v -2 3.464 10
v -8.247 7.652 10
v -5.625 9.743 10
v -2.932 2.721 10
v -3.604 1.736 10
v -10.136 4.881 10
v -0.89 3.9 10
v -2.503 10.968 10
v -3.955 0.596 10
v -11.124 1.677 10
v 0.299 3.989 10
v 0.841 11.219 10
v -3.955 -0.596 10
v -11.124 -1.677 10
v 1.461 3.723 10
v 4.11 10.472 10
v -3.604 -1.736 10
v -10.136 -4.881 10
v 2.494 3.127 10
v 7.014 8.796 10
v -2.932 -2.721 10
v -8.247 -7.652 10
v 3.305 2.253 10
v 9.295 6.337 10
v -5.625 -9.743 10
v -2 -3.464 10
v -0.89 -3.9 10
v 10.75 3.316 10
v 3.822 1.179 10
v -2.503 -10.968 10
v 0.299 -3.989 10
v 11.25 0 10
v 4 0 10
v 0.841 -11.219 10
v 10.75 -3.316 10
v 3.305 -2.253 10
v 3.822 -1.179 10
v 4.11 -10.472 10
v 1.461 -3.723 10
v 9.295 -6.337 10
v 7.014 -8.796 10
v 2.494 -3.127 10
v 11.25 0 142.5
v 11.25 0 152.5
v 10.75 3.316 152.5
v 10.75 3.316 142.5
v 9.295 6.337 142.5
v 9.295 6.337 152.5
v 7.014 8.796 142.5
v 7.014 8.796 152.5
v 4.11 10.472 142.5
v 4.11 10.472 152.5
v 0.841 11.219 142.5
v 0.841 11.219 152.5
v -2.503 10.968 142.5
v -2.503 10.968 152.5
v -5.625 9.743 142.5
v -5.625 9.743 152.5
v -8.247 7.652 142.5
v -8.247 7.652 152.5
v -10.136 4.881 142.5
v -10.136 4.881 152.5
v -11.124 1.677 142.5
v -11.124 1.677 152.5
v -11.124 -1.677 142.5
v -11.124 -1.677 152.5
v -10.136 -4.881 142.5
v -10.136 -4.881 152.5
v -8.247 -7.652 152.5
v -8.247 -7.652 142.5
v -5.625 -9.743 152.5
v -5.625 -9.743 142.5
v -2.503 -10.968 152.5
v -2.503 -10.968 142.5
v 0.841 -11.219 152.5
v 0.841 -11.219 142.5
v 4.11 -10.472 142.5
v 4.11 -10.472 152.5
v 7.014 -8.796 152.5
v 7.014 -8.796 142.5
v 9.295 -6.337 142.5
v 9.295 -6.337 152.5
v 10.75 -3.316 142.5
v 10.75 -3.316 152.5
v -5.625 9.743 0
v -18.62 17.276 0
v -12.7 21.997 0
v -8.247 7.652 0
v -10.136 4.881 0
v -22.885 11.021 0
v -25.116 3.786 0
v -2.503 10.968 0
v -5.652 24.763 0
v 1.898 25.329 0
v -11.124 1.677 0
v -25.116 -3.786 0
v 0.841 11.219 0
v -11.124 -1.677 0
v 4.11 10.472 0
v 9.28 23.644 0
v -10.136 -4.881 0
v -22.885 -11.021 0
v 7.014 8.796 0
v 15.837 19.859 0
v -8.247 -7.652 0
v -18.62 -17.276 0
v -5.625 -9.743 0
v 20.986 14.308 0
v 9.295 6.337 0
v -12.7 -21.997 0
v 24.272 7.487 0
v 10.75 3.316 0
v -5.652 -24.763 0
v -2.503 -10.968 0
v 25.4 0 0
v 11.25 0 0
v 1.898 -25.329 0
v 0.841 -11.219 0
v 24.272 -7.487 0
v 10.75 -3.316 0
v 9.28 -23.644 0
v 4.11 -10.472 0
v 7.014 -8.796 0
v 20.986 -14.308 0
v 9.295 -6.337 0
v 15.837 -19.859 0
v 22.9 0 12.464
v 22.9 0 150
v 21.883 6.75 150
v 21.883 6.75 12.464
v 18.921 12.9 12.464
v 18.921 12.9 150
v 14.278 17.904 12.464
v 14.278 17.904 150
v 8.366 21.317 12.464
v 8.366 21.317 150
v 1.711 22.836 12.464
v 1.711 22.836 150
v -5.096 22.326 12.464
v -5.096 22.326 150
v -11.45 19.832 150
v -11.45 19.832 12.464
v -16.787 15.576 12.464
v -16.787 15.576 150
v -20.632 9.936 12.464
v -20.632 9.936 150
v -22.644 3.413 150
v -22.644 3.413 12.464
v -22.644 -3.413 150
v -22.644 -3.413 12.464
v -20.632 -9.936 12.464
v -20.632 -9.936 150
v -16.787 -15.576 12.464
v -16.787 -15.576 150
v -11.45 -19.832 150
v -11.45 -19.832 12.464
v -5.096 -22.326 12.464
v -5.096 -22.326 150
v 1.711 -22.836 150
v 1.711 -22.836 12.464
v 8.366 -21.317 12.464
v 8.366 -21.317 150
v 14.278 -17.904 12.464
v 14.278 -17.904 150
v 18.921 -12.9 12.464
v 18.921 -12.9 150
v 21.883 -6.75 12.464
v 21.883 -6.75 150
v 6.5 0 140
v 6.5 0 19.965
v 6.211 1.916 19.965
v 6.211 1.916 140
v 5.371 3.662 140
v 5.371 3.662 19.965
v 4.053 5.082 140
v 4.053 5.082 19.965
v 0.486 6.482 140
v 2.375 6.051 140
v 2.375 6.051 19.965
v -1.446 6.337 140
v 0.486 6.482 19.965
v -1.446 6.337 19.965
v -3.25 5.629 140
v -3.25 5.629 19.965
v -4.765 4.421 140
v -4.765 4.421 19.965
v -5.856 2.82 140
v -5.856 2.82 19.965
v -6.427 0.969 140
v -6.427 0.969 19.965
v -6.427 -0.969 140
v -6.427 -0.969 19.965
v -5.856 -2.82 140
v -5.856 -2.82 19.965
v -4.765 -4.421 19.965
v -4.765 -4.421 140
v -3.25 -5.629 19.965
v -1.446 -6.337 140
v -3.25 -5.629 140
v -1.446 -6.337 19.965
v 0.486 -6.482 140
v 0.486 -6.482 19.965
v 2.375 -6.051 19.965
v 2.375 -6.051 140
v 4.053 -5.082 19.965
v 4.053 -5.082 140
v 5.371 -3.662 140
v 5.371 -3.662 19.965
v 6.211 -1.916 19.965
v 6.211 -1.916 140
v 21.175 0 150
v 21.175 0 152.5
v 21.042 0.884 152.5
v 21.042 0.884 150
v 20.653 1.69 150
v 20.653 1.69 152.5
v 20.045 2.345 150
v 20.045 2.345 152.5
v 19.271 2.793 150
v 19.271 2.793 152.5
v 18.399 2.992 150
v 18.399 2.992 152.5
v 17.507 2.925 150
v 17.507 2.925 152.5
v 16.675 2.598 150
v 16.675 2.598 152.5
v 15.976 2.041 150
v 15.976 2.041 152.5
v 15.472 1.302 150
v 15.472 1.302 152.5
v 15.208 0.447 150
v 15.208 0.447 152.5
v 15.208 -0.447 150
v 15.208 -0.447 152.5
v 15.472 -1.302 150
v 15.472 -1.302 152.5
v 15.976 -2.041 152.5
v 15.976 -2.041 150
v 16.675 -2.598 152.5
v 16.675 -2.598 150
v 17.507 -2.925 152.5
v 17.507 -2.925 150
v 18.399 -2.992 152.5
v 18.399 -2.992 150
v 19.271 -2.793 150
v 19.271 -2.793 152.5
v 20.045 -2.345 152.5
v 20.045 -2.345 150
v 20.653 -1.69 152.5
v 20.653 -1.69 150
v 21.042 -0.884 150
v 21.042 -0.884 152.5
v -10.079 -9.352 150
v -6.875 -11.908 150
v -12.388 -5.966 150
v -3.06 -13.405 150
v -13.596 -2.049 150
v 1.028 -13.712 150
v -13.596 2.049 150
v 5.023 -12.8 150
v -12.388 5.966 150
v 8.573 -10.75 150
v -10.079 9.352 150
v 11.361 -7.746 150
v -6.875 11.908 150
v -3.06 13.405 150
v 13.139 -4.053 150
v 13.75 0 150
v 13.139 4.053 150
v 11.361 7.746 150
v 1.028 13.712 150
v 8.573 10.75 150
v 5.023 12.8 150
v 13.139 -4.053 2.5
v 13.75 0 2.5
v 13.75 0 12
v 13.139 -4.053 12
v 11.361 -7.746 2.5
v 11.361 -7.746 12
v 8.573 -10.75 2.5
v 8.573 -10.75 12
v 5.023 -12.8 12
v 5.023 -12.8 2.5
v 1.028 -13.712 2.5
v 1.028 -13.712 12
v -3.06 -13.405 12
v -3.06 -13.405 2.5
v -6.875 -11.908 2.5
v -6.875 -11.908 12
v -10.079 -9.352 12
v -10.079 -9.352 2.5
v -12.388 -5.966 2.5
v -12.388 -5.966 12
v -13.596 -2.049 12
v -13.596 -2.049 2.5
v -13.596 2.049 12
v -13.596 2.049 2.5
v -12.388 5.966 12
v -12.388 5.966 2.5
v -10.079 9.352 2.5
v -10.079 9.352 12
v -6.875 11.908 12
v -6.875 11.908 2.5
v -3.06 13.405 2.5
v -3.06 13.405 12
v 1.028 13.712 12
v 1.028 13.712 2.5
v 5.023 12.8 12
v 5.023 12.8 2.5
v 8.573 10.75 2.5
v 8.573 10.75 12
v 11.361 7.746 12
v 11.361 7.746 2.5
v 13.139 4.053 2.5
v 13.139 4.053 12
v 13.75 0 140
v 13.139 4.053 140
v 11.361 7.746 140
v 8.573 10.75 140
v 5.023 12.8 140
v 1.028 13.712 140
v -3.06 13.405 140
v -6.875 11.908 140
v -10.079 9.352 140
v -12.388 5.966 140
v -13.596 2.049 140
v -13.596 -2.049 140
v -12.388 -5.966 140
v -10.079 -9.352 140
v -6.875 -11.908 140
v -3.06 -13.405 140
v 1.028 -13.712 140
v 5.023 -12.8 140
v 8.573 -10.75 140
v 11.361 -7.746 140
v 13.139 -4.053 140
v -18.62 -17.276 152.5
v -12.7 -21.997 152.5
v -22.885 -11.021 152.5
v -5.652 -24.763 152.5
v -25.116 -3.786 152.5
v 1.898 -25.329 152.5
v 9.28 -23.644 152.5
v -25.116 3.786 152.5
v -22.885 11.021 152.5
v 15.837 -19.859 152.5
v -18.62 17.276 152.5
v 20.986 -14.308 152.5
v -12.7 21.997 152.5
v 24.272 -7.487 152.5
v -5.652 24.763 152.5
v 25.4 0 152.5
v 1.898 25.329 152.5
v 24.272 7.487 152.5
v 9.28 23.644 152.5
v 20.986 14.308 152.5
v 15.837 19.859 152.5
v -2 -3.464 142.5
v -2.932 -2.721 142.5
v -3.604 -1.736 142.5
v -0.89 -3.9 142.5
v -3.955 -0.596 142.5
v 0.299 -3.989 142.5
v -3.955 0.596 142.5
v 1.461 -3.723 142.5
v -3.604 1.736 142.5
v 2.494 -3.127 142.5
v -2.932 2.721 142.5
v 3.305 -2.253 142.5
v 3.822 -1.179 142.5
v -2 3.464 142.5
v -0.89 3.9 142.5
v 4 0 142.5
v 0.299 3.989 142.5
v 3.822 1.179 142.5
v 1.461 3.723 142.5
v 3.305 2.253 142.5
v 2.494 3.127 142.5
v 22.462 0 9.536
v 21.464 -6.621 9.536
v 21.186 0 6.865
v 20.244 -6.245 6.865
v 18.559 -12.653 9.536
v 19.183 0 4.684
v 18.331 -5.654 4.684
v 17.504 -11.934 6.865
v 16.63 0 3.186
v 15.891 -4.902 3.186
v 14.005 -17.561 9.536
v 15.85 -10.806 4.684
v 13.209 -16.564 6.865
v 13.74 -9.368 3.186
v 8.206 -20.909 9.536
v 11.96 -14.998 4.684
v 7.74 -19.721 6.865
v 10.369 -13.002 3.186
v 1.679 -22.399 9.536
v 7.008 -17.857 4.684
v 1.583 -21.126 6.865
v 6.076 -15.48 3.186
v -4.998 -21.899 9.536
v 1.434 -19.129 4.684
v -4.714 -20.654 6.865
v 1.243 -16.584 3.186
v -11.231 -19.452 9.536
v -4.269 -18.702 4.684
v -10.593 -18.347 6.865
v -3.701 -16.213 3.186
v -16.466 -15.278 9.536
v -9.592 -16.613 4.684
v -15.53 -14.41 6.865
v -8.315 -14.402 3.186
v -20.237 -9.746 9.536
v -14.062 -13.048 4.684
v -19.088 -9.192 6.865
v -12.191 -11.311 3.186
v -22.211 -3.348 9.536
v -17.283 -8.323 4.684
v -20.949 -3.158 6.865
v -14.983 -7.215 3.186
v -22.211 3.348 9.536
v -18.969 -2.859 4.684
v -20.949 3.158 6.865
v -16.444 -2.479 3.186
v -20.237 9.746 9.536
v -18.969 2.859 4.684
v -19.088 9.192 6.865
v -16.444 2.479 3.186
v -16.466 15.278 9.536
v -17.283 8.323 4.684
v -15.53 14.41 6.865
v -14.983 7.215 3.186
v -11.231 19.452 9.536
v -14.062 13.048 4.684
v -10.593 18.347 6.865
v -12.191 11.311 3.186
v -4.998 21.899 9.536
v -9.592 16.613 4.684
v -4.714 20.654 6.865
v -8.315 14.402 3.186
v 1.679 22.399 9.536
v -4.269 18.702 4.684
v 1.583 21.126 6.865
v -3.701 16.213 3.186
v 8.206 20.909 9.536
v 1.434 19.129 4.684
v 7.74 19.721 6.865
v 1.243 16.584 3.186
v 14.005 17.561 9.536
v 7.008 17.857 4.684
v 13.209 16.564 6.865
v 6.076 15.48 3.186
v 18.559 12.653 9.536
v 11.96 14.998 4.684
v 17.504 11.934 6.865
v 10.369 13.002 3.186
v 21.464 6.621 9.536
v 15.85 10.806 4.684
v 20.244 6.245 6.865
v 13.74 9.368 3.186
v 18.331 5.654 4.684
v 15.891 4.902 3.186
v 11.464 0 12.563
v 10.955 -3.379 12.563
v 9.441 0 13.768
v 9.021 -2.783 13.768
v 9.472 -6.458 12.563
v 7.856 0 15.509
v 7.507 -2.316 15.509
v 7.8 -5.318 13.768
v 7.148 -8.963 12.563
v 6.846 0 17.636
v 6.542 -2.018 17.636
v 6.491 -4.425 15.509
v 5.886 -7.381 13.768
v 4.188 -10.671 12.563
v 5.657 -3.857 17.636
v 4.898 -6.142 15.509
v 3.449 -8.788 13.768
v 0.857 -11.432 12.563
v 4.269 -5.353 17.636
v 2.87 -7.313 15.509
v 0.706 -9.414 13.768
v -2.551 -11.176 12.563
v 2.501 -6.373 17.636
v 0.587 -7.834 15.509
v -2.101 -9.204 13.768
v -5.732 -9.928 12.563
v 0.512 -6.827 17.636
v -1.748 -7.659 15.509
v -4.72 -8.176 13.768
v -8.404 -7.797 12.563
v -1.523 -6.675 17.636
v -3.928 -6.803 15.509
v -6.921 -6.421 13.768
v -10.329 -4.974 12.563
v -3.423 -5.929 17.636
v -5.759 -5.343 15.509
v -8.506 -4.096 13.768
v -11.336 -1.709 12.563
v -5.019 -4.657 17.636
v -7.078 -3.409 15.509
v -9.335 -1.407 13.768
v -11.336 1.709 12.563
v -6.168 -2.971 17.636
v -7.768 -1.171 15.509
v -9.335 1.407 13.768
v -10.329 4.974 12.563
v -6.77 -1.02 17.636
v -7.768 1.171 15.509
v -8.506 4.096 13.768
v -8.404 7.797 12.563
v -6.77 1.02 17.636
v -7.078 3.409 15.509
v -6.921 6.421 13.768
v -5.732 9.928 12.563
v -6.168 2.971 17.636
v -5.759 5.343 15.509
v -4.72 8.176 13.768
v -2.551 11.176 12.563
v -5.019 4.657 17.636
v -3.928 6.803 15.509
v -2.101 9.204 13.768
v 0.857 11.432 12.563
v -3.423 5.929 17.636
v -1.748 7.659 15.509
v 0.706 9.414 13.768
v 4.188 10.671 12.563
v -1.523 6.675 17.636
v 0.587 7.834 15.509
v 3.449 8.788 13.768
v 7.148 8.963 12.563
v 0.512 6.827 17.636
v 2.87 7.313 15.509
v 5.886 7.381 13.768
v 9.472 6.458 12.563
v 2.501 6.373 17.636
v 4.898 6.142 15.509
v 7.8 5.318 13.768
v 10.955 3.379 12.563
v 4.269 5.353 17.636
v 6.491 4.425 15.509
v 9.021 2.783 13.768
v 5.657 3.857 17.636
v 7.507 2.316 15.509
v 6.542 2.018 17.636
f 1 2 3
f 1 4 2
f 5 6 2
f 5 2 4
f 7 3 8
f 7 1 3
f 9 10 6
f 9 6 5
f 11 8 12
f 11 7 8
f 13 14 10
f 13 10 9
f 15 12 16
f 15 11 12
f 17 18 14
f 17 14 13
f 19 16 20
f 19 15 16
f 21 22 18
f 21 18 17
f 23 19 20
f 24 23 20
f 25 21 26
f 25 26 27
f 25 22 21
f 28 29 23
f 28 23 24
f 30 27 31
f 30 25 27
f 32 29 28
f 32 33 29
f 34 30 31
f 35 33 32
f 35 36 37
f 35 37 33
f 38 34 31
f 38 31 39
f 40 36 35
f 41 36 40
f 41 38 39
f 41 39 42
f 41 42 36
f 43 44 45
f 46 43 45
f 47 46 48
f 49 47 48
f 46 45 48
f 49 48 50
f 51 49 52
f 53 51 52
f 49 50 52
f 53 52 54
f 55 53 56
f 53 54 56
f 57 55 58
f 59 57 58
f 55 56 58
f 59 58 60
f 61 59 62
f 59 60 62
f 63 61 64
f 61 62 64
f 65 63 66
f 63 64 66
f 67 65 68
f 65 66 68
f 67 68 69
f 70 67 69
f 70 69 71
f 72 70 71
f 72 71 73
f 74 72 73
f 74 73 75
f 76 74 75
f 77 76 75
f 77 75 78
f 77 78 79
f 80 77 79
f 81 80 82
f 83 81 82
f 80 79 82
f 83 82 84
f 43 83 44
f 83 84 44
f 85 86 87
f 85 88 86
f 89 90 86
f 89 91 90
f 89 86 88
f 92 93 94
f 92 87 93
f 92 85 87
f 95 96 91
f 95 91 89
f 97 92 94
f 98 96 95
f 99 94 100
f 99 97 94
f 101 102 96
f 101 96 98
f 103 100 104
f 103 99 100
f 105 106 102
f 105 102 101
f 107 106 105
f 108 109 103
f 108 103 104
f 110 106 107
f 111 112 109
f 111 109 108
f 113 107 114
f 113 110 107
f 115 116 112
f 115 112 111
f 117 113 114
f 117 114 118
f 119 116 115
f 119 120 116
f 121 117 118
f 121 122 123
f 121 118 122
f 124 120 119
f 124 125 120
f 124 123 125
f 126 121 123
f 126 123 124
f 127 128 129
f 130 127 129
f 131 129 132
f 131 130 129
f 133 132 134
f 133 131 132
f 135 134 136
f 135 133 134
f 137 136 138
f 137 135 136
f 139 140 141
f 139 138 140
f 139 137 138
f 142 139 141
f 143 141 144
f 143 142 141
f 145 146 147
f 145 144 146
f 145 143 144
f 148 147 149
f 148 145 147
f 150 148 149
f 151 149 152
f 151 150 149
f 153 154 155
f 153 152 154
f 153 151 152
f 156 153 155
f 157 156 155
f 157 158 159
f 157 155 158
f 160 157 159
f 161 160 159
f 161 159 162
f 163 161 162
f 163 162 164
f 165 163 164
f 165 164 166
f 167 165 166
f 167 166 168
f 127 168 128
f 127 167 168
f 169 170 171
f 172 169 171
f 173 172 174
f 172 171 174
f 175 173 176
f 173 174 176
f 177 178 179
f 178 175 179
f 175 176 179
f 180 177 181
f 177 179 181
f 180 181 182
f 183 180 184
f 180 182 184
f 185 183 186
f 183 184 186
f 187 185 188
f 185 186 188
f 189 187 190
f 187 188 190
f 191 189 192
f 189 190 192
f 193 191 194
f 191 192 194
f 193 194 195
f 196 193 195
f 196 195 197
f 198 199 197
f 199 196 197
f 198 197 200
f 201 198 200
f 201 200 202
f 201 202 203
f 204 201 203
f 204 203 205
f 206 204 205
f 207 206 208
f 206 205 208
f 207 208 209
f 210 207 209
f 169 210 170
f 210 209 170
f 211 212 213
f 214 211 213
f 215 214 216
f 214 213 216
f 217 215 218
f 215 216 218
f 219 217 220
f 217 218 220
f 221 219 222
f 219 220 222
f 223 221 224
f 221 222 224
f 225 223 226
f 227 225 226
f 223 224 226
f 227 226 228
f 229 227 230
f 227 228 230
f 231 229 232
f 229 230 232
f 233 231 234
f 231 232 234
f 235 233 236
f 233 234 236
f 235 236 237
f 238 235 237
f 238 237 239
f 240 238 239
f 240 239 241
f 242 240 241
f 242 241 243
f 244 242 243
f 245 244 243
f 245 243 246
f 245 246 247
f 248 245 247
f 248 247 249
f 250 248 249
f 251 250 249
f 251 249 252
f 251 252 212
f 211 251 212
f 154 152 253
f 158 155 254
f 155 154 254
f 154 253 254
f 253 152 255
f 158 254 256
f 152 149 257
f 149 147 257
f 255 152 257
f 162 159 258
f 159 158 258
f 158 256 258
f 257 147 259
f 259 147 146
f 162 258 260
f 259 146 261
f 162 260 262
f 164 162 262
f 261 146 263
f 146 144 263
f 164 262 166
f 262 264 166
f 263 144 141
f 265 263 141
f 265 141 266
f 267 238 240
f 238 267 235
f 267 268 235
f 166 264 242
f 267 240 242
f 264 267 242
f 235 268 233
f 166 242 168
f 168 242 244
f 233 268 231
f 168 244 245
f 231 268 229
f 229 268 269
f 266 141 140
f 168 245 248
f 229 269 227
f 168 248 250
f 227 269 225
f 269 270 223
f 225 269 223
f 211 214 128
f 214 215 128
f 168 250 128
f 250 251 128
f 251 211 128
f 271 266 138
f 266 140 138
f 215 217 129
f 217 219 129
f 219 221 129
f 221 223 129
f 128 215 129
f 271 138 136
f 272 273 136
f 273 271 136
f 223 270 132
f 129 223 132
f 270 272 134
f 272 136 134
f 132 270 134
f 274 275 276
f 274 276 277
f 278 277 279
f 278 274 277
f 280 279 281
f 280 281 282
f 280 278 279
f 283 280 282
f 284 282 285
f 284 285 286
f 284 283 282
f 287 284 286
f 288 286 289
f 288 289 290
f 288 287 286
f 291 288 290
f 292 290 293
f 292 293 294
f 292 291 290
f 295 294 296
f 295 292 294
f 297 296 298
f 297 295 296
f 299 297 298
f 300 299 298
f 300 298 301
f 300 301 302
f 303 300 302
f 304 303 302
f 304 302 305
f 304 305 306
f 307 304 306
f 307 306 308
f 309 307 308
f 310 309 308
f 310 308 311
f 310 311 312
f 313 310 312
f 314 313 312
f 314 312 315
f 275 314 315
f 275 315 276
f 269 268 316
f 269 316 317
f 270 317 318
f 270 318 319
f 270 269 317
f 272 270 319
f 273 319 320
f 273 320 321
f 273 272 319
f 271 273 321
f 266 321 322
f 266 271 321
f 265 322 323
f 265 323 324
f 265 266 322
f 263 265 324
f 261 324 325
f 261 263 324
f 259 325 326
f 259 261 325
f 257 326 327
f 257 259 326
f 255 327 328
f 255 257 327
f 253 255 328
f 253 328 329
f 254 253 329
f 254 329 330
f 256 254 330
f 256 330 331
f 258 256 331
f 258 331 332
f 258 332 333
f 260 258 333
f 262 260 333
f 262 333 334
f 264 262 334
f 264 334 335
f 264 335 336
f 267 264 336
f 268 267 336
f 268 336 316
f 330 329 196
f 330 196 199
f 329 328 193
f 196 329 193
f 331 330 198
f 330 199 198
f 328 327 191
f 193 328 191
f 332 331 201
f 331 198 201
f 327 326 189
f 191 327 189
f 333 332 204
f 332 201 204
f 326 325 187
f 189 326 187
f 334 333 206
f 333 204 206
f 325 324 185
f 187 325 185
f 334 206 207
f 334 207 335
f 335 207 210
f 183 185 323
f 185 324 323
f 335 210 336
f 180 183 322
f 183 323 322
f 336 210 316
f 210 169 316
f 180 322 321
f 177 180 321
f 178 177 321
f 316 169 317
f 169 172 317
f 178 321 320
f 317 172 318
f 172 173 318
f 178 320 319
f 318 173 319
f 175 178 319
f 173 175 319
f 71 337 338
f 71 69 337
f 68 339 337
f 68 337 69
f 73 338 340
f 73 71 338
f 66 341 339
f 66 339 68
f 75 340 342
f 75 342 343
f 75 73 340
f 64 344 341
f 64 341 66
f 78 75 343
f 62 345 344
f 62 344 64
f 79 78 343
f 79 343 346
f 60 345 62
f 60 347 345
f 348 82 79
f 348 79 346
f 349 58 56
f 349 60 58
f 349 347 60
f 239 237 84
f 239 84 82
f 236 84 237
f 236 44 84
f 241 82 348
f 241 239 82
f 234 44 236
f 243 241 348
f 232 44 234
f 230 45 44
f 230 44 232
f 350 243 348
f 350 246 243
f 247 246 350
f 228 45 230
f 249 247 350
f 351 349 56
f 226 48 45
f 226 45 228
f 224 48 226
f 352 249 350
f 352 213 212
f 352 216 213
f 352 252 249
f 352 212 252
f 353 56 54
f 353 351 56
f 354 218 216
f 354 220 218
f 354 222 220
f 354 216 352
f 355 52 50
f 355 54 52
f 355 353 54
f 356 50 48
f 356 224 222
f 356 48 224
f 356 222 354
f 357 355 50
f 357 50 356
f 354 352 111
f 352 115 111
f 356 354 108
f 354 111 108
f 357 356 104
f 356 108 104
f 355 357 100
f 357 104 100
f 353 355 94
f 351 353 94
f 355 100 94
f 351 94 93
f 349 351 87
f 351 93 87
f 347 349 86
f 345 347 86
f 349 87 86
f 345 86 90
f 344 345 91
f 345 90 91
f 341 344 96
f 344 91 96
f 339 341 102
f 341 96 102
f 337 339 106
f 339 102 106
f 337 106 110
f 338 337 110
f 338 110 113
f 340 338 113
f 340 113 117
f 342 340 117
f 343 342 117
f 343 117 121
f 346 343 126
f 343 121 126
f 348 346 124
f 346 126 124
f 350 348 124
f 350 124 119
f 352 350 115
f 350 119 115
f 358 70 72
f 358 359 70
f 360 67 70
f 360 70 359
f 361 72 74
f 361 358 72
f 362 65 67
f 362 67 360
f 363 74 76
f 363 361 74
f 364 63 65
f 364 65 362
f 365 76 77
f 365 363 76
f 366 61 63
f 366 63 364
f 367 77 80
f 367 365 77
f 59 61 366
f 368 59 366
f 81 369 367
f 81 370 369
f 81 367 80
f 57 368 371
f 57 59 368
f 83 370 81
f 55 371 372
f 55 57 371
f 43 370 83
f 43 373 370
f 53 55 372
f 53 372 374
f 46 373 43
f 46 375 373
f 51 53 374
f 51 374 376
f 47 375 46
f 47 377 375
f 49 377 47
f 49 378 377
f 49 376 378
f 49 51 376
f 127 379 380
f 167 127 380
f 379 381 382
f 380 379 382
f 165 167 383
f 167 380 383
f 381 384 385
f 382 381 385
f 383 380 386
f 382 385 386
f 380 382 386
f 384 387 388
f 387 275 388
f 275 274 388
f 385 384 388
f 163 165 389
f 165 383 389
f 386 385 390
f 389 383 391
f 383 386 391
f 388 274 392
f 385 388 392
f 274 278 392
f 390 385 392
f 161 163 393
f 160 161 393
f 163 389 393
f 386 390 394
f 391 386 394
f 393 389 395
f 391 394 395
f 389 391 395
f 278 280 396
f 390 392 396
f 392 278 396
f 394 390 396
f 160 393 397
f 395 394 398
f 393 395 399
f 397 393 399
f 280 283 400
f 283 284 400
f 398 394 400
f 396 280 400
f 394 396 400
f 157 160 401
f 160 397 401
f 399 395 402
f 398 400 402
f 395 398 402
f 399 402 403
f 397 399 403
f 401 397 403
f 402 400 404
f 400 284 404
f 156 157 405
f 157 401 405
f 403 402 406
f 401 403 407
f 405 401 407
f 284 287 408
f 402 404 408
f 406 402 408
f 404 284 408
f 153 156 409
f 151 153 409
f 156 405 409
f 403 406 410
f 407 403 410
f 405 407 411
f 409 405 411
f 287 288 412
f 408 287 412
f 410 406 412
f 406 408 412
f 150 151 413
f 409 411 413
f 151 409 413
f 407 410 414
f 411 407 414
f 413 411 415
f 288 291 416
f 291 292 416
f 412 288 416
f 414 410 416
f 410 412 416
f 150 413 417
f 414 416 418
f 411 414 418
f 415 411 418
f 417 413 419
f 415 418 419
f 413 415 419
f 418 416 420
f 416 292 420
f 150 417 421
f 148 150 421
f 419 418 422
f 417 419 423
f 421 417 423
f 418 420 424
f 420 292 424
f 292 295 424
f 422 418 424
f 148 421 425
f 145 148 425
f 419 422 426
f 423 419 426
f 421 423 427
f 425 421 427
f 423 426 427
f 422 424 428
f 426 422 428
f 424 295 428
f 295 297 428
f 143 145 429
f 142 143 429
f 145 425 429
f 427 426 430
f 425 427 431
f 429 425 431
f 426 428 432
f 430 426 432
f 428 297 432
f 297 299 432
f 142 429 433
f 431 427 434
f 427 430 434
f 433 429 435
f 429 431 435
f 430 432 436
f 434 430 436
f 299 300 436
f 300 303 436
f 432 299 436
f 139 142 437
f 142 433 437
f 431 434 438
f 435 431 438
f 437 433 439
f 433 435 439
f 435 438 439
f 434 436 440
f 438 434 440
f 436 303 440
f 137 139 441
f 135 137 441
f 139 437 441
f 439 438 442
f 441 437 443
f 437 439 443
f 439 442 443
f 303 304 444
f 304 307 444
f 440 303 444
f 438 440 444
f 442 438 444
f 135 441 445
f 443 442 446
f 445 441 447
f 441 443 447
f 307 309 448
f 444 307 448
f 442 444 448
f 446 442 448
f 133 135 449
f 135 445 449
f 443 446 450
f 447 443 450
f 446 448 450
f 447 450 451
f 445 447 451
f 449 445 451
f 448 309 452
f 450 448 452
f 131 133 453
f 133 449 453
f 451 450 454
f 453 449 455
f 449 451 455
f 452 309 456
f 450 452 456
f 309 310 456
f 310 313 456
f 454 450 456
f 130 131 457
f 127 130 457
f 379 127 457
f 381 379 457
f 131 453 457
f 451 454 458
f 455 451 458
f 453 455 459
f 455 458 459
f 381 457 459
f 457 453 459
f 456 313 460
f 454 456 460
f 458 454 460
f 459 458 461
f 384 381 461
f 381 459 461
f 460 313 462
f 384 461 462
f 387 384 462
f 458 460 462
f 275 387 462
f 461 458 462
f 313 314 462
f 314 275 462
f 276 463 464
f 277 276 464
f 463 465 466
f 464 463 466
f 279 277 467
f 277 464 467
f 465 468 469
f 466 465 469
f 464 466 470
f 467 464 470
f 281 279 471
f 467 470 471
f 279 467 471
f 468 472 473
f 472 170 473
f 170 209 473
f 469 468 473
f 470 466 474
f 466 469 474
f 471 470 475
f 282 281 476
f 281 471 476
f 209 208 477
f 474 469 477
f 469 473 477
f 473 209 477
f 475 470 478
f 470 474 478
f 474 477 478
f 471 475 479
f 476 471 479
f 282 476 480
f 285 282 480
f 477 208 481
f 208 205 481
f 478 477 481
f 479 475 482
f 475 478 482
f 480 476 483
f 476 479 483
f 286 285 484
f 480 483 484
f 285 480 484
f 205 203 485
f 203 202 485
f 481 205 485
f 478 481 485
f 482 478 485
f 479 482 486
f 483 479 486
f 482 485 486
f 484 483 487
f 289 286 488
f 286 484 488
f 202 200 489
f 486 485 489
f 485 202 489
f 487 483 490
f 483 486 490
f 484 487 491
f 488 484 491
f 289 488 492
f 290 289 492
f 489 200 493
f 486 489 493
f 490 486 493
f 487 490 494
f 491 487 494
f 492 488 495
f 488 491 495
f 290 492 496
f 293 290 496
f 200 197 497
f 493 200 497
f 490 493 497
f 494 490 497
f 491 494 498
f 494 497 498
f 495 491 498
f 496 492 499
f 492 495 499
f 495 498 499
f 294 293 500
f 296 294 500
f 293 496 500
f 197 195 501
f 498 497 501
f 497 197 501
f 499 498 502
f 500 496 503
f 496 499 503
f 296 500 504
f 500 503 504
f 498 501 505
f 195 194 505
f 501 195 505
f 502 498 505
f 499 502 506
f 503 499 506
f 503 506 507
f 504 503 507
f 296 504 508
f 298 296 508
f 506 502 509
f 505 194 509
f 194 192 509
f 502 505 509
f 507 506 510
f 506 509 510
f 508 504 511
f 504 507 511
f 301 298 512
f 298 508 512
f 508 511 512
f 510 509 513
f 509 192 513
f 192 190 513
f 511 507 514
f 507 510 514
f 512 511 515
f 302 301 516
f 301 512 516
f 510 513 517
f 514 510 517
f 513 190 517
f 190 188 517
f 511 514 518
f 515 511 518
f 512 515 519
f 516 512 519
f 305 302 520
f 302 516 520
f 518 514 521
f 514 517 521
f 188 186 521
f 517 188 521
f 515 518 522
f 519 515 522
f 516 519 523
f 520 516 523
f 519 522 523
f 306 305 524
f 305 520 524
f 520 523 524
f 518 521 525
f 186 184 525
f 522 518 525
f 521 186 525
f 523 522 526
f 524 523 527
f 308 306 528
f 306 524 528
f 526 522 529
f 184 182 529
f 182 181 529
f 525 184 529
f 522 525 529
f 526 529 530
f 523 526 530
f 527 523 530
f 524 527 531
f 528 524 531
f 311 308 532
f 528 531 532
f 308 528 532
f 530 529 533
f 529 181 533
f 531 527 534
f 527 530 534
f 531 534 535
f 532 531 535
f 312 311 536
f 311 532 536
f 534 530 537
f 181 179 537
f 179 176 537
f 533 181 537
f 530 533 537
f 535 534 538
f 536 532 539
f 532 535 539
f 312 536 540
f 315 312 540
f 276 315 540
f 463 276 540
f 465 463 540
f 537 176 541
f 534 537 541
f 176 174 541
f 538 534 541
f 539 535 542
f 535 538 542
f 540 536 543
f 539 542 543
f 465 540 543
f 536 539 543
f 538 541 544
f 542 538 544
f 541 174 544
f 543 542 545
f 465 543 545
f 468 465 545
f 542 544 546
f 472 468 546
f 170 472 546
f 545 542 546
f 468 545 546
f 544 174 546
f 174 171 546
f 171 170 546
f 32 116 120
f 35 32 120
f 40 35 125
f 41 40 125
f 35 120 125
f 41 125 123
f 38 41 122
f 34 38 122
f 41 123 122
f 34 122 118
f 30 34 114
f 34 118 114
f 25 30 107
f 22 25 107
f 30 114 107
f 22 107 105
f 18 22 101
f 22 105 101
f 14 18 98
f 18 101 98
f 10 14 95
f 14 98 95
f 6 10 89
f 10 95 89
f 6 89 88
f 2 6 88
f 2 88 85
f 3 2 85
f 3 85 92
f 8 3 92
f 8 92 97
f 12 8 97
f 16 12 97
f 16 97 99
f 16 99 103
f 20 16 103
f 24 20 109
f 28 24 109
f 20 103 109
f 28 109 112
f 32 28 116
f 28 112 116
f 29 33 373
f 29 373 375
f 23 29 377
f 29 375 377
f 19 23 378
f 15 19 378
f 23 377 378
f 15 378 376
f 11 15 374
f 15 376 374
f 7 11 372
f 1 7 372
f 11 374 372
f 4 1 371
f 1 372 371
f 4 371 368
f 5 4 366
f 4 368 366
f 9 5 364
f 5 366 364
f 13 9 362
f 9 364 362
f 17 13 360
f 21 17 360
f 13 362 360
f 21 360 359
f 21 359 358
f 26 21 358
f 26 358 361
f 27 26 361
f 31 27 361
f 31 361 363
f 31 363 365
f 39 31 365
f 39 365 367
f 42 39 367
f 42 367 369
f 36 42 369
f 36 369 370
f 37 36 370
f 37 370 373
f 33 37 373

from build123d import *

# Parameters (mm, degrees)
F0_R      = 25.4
F1_DEPTH  = 152.5
F2_T      = -2.5
F3_R      = 6.5
F4_DEPTH  = 150
F5_T      = -2.5
F6_R      = 13.75
F7_DEPTH  = 12
F8_R      = 11.25
F11_DEPTH = 10
F12_R     = 25.4
F13_DEPTH = 2.5
F14_R     = 13.75
F15_DEPTH = 12.5
F16_R     = 11.25
F17_DEPTH = 10
F18_R     = 4
F19_DEPTH = 142.501
F20_R     = 3
F21_DEPTH = 25


# Not quite as in the source:
# - a fillet or chamfer that OpenCascade refuses, or shapes differently, is made with other operations: its cross-section is extruded or revolved along the edge and cut away or added


with BuildPart() as f1:
    # F0 (on Top) → F1 (new body)
    with BuildSketch(Plane.XY):
        Circle(F0_R)
    extrude(amount=F1_DEPTH)

    # F2
    f2_openings = [f1.faces().sort_by_distance(p)[0] for p in [
        (0, 0, 152.5),
    ]]
    offset(amount=F2_T, openings=f2_openings)

    # F3 (on face) → F4 (join)
    with BuildSketch(Plane.XY.offset(2.5)):
        Circle(F3_R)
    extrude(amount=F4_DEPTH)

    # F5: a shell. OpenCascade refuses it in one call, so the cavity is built on its own and cut out:
    # the body offset inwards by the wall thickness, plus a prism from it out through each open face.
    f5_core = offset(f1.part, amount=F5_T, kind=Kind.INTERSECTION, mode=Mode.PRIVATE)
    f5_exits = [f5_core.faces().sort_by_distance(p)[0] for p in [
        (0, 0, 150),
    ]]
    add(f5_core, mode=Mode.SUBTRACT)
    extrude(f5_exits, amount=-F5_T, mode=Mode.SUBTRACT)

    # F6 (on face) → F7 (join)
    with BuildSketch(Plane(origin=(0, 0, 0), x_dir=(1, 0, 0), z_dir=(0, 0, -1))):
        Circle(F6_R)
    extrude(amount=-F7_DEPTH)

    # F9: fillet of radius 10 on 1 edges, made by hand

    # F9_s1 → F9_t2 (revolve)
    with BuildSketch(Plane.XZ):
        with BuildLine():
            ThreePointArc((22.9, 12.4638095124), (20.2654599313, 5.6999348832), (13.75, 2.5))
            Line((13.75, 2.5), (22.9, 2.5))
            Line((22.9, 2.5), (22.9, 12.4638095124))
        make_face()
    revolve(axis=Axis((0, 0, 2.5), (0, 0, -1)))

    # F10: fillet of radius 8 on 1 edges, made by hand

    # F10_s1 → F10_t2 (revolve)
    with BuildSketch(Plane.XZ):
        with BuildLine():
            ThreePointArc((13.75, 12), (8.5839202169, 14.5796013539), (6.5, 19.964766161))
            Line((6.5, 19.964766161), (6.5, 12))
            Line((6.5, 12), (13.75, 12))
        make_face()
    revolve(axis=Axis((0, 0, 12), (0, 0, -1)))

    # F8 (on face) → F11 (cut)
    with BuildSketch(Plane(origin=(0, 0, 0), x_dir=(1, 0, 0), z_dir=(0, 0, -1))):
        Circle(F8_R)
    extrude(amount=-F11_DEPTH, mode=Mode.SUBTRACT)

    # F12 (on face) → F13 (join)
    with BuildSketch(Plane.XY.offset(152.5)):
        Circle(F12_R)
    extrude(amount=-F13_DEPTH)

    # F14 (on face) → F15 (join)
    with BuildSketch(Plane.XY.offset(152.5)):
        Circle(F14_R)
    extrude(amount=-F15_DEPTH)

    # F16 (on face) → F17 (cut)
    with BuildSketch(Plane.XY.offset(152.5)):
        Circle(F16_R)
    extrude(amount=-F17_DEPTH, mode=Mode.SUBTRACT)

    # F18 (on face) → F19 (cut, through all)
    with BuildSketch(Plane.XY.offset(142.5)):
        Circle(F18_R)
    extrude(amount=-F19_DEPTH, mode=Mode.SUBTRACT)

    # F20 (on face) → F21 (cut)
    with BuildSketch(Plane.XY.offset(152.5)):
        with Locations((18.1747831392, 0)):
            Circle(F20_R)
    extrude(amount=-F21_DEPTH, mode=Mode.SUBTRACT)


solid = f1.part
